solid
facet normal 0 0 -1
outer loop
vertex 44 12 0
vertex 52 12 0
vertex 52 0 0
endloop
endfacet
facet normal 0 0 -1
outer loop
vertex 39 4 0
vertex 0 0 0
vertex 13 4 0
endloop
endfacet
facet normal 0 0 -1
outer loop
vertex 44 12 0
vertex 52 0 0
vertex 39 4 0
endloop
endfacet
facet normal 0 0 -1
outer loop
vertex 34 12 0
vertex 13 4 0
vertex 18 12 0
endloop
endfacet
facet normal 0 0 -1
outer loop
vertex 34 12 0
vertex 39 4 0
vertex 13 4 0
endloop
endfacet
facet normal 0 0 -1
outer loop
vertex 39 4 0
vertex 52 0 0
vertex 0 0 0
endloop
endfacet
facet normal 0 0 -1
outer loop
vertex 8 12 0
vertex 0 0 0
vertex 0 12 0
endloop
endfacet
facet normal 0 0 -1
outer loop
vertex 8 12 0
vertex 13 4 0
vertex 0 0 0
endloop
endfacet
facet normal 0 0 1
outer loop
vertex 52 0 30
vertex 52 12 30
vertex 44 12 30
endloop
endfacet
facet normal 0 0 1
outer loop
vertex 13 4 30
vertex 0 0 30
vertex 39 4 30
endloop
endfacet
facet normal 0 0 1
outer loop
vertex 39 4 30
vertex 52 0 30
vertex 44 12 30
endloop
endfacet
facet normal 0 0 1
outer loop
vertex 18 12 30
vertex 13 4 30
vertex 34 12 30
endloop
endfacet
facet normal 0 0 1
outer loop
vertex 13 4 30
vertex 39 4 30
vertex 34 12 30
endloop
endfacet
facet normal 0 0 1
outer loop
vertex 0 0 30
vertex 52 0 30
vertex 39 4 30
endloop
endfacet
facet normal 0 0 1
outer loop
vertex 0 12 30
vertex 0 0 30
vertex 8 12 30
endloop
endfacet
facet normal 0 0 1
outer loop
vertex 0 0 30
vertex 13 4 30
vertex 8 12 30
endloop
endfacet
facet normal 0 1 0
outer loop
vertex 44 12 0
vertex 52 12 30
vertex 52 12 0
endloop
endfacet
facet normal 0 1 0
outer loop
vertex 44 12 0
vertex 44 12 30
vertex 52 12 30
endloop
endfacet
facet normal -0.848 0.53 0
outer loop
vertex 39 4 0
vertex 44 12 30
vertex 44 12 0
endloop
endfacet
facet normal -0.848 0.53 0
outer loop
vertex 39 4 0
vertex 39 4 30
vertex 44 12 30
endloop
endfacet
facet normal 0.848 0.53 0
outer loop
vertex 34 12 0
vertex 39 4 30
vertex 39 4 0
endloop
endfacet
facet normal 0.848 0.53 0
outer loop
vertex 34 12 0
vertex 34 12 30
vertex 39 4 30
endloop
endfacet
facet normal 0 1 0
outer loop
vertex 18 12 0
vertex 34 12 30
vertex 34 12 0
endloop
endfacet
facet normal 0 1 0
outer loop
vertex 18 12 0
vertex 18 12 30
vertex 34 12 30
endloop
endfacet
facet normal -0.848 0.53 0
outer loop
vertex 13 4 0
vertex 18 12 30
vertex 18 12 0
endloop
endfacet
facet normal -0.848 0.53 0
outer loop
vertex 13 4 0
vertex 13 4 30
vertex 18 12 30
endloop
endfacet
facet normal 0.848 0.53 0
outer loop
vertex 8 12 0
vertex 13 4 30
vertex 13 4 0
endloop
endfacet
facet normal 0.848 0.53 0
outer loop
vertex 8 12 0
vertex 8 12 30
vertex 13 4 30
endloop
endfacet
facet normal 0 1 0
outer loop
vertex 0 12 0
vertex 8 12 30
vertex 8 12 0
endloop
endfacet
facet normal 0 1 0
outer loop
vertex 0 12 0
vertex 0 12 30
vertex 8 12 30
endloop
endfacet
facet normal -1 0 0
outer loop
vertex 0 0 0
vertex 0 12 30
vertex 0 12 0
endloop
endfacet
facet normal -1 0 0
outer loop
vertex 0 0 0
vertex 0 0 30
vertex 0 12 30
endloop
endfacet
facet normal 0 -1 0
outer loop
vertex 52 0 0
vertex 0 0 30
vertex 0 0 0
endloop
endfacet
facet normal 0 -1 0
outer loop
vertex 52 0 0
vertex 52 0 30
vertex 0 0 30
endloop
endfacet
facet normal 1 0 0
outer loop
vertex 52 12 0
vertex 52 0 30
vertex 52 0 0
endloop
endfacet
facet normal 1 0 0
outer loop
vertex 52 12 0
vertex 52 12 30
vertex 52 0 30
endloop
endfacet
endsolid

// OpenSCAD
$fn = 32;

// ----------------------------------------------------------------------
// V guide rail: doublev, 52 mm wide
// ----------------------------------------------------------------------

// --- parameters (mm) ---
rail_w = 52;              // rail width, X
base_t = 12;              // base plate thickness
v_depth = 8;              // V feature depth / height
v_half_w = 10;            // half width of the V at the base face
plate_t = 30;             // rail length, Z (the extrusion height)
groove_off = 13;          // offset of each groove from the centreline

centre_x = rail_w / 2;  // rail centreline
groove_a = centre_x - groove_off;  // axis of the first groove
groove_b = centre_x + groove_off;  // axis of the second groove

profile = [[0, 0], [52, 0], [52, 12], [44, 12], [39, 4], [34, 12], [18, 12], [13, 4], [8, 12], [0, 12]];  // primary outline, 10 points, counter clockwise

// --- the one profile operation ---
linear_extrude(height = plate_t) polygon(points = profile);
